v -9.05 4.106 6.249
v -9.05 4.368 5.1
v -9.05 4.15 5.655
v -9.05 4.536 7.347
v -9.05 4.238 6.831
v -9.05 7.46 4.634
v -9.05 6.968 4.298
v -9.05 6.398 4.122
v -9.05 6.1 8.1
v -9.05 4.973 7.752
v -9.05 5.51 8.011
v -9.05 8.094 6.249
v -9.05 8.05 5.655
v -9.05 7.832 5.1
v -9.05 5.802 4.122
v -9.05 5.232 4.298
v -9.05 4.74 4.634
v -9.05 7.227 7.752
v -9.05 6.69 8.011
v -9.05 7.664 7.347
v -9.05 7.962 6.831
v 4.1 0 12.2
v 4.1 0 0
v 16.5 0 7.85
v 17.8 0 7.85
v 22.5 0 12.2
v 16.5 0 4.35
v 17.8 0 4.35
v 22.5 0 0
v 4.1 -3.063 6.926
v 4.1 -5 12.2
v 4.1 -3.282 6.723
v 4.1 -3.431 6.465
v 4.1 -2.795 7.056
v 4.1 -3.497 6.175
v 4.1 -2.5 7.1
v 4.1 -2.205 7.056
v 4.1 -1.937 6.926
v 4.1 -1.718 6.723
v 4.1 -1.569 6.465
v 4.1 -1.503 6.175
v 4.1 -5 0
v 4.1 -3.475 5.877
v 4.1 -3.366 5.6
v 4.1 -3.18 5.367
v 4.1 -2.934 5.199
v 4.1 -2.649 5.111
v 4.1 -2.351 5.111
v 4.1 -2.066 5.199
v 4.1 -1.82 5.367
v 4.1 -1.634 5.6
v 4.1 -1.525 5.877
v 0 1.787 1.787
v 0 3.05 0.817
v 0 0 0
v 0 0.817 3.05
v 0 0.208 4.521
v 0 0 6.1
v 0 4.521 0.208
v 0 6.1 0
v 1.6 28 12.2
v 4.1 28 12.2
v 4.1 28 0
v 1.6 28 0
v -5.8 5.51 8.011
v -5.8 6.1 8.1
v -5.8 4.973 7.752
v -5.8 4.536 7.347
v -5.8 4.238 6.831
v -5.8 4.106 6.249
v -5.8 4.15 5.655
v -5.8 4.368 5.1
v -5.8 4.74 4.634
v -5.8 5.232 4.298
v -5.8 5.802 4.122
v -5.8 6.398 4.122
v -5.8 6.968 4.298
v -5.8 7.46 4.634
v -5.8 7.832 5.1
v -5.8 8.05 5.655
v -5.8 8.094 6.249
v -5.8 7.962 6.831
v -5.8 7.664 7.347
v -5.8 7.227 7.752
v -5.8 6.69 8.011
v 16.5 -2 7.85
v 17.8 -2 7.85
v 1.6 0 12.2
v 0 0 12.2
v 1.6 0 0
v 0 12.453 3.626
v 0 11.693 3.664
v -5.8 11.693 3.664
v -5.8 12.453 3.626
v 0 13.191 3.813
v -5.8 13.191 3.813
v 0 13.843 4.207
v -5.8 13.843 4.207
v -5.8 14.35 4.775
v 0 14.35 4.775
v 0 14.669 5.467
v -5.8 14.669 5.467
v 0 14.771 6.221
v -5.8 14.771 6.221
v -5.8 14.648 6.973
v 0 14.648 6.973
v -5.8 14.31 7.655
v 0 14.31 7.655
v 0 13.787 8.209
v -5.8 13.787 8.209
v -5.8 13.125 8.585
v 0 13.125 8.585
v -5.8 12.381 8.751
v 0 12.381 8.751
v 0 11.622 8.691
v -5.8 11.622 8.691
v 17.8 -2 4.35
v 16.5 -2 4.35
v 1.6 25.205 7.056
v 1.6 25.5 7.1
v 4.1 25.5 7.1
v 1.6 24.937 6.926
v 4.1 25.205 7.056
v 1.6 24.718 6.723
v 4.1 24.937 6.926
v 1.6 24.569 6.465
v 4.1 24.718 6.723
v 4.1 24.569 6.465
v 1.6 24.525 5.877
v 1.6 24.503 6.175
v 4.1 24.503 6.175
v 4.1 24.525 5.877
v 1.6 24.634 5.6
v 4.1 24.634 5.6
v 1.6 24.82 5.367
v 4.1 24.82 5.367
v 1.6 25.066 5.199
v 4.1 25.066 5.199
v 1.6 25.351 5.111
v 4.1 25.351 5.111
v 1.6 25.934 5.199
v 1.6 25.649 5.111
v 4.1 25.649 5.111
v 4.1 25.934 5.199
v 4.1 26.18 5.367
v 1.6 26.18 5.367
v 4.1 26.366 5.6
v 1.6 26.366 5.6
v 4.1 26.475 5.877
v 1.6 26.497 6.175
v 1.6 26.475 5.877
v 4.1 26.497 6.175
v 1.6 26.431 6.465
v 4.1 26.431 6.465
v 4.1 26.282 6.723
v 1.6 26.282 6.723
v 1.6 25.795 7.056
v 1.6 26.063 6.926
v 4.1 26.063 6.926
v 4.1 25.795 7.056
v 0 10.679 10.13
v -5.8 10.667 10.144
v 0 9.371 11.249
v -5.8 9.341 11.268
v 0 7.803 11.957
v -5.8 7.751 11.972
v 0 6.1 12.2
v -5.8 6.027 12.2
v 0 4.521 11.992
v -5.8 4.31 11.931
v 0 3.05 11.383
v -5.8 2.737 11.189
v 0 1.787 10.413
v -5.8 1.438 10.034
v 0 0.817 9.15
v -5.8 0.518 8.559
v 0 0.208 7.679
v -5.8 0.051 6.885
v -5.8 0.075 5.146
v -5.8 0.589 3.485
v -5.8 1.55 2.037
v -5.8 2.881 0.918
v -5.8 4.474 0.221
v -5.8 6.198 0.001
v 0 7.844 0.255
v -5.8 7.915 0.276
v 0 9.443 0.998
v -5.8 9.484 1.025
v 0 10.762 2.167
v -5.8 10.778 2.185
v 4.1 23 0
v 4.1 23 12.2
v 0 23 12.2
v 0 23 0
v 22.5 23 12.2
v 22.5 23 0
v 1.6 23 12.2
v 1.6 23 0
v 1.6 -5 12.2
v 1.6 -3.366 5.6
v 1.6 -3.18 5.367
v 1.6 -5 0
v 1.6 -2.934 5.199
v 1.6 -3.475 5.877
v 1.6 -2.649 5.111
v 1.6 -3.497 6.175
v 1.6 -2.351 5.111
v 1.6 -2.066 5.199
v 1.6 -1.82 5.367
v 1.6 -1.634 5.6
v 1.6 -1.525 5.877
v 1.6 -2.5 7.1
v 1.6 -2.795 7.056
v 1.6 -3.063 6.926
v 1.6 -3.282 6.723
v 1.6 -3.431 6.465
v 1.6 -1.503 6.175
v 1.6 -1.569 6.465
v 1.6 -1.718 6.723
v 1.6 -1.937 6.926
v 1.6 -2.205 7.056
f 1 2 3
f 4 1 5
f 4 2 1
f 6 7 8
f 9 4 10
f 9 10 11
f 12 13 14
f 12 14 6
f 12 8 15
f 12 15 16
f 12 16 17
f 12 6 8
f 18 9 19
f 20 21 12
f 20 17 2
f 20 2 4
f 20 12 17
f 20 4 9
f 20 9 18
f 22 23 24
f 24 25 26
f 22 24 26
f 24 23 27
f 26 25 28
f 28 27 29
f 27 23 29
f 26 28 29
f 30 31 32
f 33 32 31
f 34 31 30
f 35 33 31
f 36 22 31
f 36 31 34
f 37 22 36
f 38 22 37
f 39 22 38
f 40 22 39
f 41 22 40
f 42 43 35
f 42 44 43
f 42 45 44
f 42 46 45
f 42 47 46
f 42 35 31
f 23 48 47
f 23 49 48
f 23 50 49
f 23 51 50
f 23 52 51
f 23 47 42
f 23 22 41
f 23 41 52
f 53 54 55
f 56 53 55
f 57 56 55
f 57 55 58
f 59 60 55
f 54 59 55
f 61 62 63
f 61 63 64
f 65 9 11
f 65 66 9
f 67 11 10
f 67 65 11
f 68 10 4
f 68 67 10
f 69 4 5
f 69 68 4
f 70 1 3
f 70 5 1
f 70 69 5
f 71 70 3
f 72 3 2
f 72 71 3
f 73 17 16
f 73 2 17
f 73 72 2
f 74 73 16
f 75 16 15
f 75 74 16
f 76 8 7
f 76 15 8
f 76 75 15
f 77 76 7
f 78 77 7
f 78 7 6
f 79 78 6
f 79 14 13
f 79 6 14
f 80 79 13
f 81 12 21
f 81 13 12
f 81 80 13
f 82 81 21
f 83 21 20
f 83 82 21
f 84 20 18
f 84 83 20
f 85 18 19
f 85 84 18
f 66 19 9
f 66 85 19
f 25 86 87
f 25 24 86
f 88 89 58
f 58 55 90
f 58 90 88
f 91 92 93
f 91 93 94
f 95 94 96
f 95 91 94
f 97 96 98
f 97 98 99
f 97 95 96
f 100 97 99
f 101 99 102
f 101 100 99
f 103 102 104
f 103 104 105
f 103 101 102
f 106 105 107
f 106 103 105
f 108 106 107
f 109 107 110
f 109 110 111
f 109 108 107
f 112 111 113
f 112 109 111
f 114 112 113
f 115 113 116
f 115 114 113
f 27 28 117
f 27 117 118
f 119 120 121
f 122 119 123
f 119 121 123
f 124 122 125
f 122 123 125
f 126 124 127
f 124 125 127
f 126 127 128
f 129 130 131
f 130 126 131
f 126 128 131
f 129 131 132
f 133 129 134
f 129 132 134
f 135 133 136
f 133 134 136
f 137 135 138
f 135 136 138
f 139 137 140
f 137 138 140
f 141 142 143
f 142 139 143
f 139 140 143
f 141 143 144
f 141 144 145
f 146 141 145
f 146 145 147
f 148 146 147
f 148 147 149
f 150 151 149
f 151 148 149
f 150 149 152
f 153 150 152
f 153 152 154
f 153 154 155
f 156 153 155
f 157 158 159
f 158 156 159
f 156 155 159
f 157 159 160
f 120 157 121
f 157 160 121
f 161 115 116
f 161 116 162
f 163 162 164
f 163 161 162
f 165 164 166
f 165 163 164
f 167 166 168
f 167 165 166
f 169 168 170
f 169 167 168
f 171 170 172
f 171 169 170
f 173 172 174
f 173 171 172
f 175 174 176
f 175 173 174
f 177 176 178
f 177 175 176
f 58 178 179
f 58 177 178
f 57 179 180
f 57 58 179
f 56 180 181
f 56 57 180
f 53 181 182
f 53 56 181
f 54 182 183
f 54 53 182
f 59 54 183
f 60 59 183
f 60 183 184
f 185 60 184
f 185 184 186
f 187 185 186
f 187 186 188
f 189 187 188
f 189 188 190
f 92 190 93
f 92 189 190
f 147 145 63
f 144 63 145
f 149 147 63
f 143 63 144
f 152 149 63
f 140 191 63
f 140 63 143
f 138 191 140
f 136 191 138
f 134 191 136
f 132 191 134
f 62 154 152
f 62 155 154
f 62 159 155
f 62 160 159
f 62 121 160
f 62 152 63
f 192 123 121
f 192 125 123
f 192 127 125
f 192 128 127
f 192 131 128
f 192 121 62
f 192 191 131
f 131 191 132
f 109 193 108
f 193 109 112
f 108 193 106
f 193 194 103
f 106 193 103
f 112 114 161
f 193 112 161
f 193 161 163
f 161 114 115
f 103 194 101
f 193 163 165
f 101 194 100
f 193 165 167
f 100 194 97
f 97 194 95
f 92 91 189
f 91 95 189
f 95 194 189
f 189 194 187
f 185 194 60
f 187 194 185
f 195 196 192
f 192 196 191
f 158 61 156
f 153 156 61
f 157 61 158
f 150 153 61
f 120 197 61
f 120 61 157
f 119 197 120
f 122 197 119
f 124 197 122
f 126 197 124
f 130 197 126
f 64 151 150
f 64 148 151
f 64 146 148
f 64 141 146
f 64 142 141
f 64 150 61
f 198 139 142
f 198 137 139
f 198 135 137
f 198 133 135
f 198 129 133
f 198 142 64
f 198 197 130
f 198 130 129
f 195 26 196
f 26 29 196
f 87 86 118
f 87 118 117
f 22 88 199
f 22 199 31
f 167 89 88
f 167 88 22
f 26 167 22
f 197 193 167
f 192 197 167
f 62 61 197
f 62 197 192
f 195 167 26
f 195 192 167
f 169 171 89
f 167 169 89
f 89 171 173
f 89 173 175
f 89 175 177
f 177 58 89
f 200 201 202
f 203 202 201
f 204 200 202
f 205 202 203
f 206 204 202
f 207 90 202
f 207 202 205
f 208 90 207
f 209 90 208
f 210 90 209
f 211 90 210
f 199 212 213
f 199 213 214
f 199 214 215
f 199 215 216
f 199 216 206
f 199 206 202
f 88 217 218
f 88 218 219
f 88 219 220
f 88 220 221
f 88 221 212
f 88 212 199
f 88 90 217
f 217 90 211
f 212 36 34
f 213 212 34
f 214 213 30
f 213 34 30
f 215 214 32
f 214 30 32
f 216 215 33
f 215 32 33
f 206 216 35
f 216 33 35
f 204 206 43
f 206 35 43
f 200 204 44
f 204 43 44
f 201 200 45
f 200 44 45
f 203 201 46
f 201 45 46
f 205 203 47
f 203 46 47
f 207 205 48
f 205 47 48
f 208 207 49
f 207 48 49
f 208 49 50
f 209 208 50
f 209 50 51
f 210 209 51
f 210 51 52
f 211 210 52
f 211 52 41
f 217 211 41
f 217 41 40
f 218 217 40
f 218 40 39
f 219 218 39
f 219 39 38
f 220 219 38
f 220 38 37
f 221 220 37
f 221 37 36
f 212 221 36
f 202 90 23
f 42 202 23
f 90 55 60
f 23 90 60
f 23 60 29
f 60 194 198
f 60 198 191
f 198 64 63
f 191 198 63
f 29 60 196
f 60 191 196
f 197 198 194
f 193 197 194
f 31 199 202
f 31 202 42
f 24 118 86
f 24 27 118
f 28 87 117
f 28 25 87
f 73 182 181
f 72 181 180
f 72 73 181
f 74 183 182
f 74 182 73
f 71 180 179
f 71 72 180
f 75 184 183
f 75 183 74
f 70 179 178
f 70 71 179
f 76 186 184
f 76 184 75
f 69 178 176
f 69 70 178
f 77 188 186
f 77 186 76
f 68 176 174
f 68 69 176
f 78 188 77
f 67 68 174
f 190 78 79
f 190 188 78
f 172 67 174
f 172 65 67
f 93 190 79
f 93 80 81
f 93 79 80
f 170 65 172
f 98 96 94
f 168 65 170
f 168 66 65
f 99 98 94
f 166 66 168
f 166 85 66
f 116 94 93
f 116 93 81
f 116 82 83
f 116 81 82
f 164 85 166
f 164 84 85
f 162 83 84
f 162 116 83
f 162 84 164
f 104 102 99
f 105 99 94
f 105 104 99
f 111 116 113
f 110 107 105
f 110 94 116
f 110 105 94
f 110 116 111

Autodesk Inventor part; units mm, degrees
ref_plane "YZ Plane" through (0, 0, 0) normal (1, 0, 0) x (0, 1, 0)
ref_plane "XZ Plane" through (0, 0, 0) normal (0, 1, 0) x (-1, 0, 0)
ref_plane "XY Plane" through (0, 0, 0) normal (0, 0, 1) x (1, 0, 0)
sketch "Sketch1" plane through (0, 0, 0) normal (0, 0, 1) x (1, 0, 0)
  line L0 (0, 0) -> (22.5, 0)
  line L1 (22.5, 0) -> (22.5, 23)
  line L2 (22.5, 23) -> (0, 23)
  line L3 (0, 23) -> (0, 0)
  dimension "d0" = 22.5
  dimension "d1" = 23
extrude "Extrusion1" add sketch "Sketch1" along normal blind 12.2
sketch "Sketch2" plane through (0, 0, 0) normal (0, -1, 0) x (1, 0, 0)
  line L0 (0, 12.2) -> (22.5, 12.2) projected
  line L1 (0, 0) -> (22.5, 0) projected
  line L2 (1.6, 12.2) -> (4.1, 12.2)
  line L3 (4.1, 12.2) -> (4.1, 0)
  line L4 (4.1, 0) -> (1.6, 0)
  line L5 (1.6, 0) -> (1.6, 12.2)
  line L6 (22.5, 0) -> (22.5, 12.2) projected
  dimension "d4" = 2.5
  dimension "d5" = 18.4
extrude "Extrusion2" add sketch "Sketch2" along normal blind 5 contours L0 L3 L1 L5
ref_plane "Work Plane1" through (22.5, 11.5, 0) normal (0, -1, 0) x (1, 0, 0)
mirror "Mirror1" about plane through (22.5, 11.5, 0) normal (0, -1, 0) of "Extrusion2"
ref_plane "Work Plane3" through (0, -2.5, 0) normal (0, -1, 0) x (1, 0, 0)
ref_plane "Work Plane4" through (0, 0, 6.1) normal (0, 0, 1) x (1, 0, 0)
hole "Hole1" at (1.6, -2.5, 6.1) direction (1, 0, 0) diameter 2 end through all
mirror "Mirror2" about plane through (22.5, 11.5, 0) normal (0, -1, 0) of "Hole1"
sketch "Sketch3" plane through (22.5, 0, 0) normal (0, -1, 0) x (1, 0, 0)
  line L0 (-4.7, 4.35) -> (-6, 4.35)
  line L1 (-6, 4.35) -> (-6, 7.85)
  line L2 (-6, 7.85) -> (-4.7, 7.85)
  line L3 (-4.7, 7.85) -> (-4.7, 4.35)
  line L4 (0, 12.2) -> (0, 0) projected
  line L5 (0, 0) -> (-18.4, 0) projected
  line L6 (-18.4, 12.2) -> (-18.4, 0) projected
  line L7 (-20.9, 12.2) -> (-18.4, 12.2) projected
  line L8 (-20.9, 0) -> (-20.9, 12.2) projected
  line L9 (-20.9, 0) -> (-22.5, 0) projected
  line L10 (-22.5, 0) -> (-22.5, 12.2) projected
  line L11 (-22.5, 12.2) -> (-20.9, 12.2) projected
  line L12 (-18.4, 12.2) -> (0, 12.2) projected
  line L13 (-18.4, 0) -> (-20.9, 0) projected
  line L14 (0, 12.2) -> (0, 0) projected
  line L15 (0, 0) -> (-18.4, 0) projected
  line L16 (-18.4, 12.2) -> (-18.4, 0) projected
  line L17 (-20.9, 12.2) -> (-18.4, 12.2) projected
  line L18 (-20.9, 0) -> (-20.9, 12.2) projected
  line L19 (-20.9, 0) -> (-22.5, 0) projected
  line L20 (-22.5, 0) -> (-22.5, 12.2) projected
  line L21 (-22.5, 12.2) -> (-20.9, 12.2) projected
  line L22 (-18.4, 12.2) -> (0, 12.2) projected
  line L23 (-18.4, 0) -> (-20.9, 0) projected
  line L24 (0, 12.2) -> (0, 0) projected
  line L25 (0, 0) -> (-18.4, 0) projected
  line L26 (-18.4, 12.2) -> (-18.4, 0) projected
  line L27 (-20.9, 12.2) -> (-18.4, 12.2) projected
  line L28 (-20.9, 0) -> (-20.9, 12.2) projected
  line L29 (-20.9, 0) -> (-22.5, 0) projected
  line L30 (-22.5, 0) -> (-22.5, 12.2) projected
  line L31 (-22.5, 12.2) -> (-20.9, 12.2) projected
  line L32 (-18.4, 12.2) -> (0, 12.2) projected
  line L33 (-18.4, 0) -> (-20.9, 0) projected
  line L34 (-27, 6.1) -> (4.5, 6.1) projected
  point P0 (-6, 6.1)
  dimension "d17" = 1.3
  dimension "d18" = 3.5
  dimension "d19" = 4.7
extrude "Extrusion3" add sketch "Sketch3" along normal blind 2 contours L0 L1 L34 L3 | L34 L1 L2 L3
sketch "Sketch4" plane through (0, 0, 0) normal (-1, 0, 0) x (0, 0, 1)
  line L0 (6.1, 34.6) -> (6.1, -11.6) projected
  circle A0 centre (6.1, 6.1) radius 6.1
  line L1 (0, 0) -> (0, 23) projected
  line L2 (0, 0) -> (12.2, 0) projected
extrude "Extrusion4" add sketch "Sketch4" along normal blind 5.8 contours A0 L0 | L0 A0
sketch "Sketch5" plane through (-5.8, 6.1, 6.1) normal (-1, 0, 0) x (0, 0, 1)
  circle A0 centre (0, 0) radius 2
  point P0 (-6.1, -6.1)
  dimension "d24" = 4
extrude "Extrusion5" add sketch "Sketch5" along normal blind 3.25
sketch "Sketch6" plane through (0, 23, 0) normal (-1, 0, 0) x (0, 0, 1)
  circle A0 centre (6.1, -16.9) radius 6.1 projected
  arc A1 (12.2, -16.9) -> (0, -16.9) centre (6.1, -16.9) ccw projected
  circle A2 centre (6.1854, -10.8006) radius 2.5717
  point P0 (0, -23)
extrude "Extrusion6" add sketch "Sketch6" along normal up to surface (5.8 mm away) contours A2 A0 | A0 A2 picked at (5.289, -10.1215) picked at (6.9125, -11.6556)
ref_plane "Work Plane2" through (22.5, 11.5, 0) normal (0, -1, 0) x (1, 0, 0)
properties part number "servo_metal_600TVL"
